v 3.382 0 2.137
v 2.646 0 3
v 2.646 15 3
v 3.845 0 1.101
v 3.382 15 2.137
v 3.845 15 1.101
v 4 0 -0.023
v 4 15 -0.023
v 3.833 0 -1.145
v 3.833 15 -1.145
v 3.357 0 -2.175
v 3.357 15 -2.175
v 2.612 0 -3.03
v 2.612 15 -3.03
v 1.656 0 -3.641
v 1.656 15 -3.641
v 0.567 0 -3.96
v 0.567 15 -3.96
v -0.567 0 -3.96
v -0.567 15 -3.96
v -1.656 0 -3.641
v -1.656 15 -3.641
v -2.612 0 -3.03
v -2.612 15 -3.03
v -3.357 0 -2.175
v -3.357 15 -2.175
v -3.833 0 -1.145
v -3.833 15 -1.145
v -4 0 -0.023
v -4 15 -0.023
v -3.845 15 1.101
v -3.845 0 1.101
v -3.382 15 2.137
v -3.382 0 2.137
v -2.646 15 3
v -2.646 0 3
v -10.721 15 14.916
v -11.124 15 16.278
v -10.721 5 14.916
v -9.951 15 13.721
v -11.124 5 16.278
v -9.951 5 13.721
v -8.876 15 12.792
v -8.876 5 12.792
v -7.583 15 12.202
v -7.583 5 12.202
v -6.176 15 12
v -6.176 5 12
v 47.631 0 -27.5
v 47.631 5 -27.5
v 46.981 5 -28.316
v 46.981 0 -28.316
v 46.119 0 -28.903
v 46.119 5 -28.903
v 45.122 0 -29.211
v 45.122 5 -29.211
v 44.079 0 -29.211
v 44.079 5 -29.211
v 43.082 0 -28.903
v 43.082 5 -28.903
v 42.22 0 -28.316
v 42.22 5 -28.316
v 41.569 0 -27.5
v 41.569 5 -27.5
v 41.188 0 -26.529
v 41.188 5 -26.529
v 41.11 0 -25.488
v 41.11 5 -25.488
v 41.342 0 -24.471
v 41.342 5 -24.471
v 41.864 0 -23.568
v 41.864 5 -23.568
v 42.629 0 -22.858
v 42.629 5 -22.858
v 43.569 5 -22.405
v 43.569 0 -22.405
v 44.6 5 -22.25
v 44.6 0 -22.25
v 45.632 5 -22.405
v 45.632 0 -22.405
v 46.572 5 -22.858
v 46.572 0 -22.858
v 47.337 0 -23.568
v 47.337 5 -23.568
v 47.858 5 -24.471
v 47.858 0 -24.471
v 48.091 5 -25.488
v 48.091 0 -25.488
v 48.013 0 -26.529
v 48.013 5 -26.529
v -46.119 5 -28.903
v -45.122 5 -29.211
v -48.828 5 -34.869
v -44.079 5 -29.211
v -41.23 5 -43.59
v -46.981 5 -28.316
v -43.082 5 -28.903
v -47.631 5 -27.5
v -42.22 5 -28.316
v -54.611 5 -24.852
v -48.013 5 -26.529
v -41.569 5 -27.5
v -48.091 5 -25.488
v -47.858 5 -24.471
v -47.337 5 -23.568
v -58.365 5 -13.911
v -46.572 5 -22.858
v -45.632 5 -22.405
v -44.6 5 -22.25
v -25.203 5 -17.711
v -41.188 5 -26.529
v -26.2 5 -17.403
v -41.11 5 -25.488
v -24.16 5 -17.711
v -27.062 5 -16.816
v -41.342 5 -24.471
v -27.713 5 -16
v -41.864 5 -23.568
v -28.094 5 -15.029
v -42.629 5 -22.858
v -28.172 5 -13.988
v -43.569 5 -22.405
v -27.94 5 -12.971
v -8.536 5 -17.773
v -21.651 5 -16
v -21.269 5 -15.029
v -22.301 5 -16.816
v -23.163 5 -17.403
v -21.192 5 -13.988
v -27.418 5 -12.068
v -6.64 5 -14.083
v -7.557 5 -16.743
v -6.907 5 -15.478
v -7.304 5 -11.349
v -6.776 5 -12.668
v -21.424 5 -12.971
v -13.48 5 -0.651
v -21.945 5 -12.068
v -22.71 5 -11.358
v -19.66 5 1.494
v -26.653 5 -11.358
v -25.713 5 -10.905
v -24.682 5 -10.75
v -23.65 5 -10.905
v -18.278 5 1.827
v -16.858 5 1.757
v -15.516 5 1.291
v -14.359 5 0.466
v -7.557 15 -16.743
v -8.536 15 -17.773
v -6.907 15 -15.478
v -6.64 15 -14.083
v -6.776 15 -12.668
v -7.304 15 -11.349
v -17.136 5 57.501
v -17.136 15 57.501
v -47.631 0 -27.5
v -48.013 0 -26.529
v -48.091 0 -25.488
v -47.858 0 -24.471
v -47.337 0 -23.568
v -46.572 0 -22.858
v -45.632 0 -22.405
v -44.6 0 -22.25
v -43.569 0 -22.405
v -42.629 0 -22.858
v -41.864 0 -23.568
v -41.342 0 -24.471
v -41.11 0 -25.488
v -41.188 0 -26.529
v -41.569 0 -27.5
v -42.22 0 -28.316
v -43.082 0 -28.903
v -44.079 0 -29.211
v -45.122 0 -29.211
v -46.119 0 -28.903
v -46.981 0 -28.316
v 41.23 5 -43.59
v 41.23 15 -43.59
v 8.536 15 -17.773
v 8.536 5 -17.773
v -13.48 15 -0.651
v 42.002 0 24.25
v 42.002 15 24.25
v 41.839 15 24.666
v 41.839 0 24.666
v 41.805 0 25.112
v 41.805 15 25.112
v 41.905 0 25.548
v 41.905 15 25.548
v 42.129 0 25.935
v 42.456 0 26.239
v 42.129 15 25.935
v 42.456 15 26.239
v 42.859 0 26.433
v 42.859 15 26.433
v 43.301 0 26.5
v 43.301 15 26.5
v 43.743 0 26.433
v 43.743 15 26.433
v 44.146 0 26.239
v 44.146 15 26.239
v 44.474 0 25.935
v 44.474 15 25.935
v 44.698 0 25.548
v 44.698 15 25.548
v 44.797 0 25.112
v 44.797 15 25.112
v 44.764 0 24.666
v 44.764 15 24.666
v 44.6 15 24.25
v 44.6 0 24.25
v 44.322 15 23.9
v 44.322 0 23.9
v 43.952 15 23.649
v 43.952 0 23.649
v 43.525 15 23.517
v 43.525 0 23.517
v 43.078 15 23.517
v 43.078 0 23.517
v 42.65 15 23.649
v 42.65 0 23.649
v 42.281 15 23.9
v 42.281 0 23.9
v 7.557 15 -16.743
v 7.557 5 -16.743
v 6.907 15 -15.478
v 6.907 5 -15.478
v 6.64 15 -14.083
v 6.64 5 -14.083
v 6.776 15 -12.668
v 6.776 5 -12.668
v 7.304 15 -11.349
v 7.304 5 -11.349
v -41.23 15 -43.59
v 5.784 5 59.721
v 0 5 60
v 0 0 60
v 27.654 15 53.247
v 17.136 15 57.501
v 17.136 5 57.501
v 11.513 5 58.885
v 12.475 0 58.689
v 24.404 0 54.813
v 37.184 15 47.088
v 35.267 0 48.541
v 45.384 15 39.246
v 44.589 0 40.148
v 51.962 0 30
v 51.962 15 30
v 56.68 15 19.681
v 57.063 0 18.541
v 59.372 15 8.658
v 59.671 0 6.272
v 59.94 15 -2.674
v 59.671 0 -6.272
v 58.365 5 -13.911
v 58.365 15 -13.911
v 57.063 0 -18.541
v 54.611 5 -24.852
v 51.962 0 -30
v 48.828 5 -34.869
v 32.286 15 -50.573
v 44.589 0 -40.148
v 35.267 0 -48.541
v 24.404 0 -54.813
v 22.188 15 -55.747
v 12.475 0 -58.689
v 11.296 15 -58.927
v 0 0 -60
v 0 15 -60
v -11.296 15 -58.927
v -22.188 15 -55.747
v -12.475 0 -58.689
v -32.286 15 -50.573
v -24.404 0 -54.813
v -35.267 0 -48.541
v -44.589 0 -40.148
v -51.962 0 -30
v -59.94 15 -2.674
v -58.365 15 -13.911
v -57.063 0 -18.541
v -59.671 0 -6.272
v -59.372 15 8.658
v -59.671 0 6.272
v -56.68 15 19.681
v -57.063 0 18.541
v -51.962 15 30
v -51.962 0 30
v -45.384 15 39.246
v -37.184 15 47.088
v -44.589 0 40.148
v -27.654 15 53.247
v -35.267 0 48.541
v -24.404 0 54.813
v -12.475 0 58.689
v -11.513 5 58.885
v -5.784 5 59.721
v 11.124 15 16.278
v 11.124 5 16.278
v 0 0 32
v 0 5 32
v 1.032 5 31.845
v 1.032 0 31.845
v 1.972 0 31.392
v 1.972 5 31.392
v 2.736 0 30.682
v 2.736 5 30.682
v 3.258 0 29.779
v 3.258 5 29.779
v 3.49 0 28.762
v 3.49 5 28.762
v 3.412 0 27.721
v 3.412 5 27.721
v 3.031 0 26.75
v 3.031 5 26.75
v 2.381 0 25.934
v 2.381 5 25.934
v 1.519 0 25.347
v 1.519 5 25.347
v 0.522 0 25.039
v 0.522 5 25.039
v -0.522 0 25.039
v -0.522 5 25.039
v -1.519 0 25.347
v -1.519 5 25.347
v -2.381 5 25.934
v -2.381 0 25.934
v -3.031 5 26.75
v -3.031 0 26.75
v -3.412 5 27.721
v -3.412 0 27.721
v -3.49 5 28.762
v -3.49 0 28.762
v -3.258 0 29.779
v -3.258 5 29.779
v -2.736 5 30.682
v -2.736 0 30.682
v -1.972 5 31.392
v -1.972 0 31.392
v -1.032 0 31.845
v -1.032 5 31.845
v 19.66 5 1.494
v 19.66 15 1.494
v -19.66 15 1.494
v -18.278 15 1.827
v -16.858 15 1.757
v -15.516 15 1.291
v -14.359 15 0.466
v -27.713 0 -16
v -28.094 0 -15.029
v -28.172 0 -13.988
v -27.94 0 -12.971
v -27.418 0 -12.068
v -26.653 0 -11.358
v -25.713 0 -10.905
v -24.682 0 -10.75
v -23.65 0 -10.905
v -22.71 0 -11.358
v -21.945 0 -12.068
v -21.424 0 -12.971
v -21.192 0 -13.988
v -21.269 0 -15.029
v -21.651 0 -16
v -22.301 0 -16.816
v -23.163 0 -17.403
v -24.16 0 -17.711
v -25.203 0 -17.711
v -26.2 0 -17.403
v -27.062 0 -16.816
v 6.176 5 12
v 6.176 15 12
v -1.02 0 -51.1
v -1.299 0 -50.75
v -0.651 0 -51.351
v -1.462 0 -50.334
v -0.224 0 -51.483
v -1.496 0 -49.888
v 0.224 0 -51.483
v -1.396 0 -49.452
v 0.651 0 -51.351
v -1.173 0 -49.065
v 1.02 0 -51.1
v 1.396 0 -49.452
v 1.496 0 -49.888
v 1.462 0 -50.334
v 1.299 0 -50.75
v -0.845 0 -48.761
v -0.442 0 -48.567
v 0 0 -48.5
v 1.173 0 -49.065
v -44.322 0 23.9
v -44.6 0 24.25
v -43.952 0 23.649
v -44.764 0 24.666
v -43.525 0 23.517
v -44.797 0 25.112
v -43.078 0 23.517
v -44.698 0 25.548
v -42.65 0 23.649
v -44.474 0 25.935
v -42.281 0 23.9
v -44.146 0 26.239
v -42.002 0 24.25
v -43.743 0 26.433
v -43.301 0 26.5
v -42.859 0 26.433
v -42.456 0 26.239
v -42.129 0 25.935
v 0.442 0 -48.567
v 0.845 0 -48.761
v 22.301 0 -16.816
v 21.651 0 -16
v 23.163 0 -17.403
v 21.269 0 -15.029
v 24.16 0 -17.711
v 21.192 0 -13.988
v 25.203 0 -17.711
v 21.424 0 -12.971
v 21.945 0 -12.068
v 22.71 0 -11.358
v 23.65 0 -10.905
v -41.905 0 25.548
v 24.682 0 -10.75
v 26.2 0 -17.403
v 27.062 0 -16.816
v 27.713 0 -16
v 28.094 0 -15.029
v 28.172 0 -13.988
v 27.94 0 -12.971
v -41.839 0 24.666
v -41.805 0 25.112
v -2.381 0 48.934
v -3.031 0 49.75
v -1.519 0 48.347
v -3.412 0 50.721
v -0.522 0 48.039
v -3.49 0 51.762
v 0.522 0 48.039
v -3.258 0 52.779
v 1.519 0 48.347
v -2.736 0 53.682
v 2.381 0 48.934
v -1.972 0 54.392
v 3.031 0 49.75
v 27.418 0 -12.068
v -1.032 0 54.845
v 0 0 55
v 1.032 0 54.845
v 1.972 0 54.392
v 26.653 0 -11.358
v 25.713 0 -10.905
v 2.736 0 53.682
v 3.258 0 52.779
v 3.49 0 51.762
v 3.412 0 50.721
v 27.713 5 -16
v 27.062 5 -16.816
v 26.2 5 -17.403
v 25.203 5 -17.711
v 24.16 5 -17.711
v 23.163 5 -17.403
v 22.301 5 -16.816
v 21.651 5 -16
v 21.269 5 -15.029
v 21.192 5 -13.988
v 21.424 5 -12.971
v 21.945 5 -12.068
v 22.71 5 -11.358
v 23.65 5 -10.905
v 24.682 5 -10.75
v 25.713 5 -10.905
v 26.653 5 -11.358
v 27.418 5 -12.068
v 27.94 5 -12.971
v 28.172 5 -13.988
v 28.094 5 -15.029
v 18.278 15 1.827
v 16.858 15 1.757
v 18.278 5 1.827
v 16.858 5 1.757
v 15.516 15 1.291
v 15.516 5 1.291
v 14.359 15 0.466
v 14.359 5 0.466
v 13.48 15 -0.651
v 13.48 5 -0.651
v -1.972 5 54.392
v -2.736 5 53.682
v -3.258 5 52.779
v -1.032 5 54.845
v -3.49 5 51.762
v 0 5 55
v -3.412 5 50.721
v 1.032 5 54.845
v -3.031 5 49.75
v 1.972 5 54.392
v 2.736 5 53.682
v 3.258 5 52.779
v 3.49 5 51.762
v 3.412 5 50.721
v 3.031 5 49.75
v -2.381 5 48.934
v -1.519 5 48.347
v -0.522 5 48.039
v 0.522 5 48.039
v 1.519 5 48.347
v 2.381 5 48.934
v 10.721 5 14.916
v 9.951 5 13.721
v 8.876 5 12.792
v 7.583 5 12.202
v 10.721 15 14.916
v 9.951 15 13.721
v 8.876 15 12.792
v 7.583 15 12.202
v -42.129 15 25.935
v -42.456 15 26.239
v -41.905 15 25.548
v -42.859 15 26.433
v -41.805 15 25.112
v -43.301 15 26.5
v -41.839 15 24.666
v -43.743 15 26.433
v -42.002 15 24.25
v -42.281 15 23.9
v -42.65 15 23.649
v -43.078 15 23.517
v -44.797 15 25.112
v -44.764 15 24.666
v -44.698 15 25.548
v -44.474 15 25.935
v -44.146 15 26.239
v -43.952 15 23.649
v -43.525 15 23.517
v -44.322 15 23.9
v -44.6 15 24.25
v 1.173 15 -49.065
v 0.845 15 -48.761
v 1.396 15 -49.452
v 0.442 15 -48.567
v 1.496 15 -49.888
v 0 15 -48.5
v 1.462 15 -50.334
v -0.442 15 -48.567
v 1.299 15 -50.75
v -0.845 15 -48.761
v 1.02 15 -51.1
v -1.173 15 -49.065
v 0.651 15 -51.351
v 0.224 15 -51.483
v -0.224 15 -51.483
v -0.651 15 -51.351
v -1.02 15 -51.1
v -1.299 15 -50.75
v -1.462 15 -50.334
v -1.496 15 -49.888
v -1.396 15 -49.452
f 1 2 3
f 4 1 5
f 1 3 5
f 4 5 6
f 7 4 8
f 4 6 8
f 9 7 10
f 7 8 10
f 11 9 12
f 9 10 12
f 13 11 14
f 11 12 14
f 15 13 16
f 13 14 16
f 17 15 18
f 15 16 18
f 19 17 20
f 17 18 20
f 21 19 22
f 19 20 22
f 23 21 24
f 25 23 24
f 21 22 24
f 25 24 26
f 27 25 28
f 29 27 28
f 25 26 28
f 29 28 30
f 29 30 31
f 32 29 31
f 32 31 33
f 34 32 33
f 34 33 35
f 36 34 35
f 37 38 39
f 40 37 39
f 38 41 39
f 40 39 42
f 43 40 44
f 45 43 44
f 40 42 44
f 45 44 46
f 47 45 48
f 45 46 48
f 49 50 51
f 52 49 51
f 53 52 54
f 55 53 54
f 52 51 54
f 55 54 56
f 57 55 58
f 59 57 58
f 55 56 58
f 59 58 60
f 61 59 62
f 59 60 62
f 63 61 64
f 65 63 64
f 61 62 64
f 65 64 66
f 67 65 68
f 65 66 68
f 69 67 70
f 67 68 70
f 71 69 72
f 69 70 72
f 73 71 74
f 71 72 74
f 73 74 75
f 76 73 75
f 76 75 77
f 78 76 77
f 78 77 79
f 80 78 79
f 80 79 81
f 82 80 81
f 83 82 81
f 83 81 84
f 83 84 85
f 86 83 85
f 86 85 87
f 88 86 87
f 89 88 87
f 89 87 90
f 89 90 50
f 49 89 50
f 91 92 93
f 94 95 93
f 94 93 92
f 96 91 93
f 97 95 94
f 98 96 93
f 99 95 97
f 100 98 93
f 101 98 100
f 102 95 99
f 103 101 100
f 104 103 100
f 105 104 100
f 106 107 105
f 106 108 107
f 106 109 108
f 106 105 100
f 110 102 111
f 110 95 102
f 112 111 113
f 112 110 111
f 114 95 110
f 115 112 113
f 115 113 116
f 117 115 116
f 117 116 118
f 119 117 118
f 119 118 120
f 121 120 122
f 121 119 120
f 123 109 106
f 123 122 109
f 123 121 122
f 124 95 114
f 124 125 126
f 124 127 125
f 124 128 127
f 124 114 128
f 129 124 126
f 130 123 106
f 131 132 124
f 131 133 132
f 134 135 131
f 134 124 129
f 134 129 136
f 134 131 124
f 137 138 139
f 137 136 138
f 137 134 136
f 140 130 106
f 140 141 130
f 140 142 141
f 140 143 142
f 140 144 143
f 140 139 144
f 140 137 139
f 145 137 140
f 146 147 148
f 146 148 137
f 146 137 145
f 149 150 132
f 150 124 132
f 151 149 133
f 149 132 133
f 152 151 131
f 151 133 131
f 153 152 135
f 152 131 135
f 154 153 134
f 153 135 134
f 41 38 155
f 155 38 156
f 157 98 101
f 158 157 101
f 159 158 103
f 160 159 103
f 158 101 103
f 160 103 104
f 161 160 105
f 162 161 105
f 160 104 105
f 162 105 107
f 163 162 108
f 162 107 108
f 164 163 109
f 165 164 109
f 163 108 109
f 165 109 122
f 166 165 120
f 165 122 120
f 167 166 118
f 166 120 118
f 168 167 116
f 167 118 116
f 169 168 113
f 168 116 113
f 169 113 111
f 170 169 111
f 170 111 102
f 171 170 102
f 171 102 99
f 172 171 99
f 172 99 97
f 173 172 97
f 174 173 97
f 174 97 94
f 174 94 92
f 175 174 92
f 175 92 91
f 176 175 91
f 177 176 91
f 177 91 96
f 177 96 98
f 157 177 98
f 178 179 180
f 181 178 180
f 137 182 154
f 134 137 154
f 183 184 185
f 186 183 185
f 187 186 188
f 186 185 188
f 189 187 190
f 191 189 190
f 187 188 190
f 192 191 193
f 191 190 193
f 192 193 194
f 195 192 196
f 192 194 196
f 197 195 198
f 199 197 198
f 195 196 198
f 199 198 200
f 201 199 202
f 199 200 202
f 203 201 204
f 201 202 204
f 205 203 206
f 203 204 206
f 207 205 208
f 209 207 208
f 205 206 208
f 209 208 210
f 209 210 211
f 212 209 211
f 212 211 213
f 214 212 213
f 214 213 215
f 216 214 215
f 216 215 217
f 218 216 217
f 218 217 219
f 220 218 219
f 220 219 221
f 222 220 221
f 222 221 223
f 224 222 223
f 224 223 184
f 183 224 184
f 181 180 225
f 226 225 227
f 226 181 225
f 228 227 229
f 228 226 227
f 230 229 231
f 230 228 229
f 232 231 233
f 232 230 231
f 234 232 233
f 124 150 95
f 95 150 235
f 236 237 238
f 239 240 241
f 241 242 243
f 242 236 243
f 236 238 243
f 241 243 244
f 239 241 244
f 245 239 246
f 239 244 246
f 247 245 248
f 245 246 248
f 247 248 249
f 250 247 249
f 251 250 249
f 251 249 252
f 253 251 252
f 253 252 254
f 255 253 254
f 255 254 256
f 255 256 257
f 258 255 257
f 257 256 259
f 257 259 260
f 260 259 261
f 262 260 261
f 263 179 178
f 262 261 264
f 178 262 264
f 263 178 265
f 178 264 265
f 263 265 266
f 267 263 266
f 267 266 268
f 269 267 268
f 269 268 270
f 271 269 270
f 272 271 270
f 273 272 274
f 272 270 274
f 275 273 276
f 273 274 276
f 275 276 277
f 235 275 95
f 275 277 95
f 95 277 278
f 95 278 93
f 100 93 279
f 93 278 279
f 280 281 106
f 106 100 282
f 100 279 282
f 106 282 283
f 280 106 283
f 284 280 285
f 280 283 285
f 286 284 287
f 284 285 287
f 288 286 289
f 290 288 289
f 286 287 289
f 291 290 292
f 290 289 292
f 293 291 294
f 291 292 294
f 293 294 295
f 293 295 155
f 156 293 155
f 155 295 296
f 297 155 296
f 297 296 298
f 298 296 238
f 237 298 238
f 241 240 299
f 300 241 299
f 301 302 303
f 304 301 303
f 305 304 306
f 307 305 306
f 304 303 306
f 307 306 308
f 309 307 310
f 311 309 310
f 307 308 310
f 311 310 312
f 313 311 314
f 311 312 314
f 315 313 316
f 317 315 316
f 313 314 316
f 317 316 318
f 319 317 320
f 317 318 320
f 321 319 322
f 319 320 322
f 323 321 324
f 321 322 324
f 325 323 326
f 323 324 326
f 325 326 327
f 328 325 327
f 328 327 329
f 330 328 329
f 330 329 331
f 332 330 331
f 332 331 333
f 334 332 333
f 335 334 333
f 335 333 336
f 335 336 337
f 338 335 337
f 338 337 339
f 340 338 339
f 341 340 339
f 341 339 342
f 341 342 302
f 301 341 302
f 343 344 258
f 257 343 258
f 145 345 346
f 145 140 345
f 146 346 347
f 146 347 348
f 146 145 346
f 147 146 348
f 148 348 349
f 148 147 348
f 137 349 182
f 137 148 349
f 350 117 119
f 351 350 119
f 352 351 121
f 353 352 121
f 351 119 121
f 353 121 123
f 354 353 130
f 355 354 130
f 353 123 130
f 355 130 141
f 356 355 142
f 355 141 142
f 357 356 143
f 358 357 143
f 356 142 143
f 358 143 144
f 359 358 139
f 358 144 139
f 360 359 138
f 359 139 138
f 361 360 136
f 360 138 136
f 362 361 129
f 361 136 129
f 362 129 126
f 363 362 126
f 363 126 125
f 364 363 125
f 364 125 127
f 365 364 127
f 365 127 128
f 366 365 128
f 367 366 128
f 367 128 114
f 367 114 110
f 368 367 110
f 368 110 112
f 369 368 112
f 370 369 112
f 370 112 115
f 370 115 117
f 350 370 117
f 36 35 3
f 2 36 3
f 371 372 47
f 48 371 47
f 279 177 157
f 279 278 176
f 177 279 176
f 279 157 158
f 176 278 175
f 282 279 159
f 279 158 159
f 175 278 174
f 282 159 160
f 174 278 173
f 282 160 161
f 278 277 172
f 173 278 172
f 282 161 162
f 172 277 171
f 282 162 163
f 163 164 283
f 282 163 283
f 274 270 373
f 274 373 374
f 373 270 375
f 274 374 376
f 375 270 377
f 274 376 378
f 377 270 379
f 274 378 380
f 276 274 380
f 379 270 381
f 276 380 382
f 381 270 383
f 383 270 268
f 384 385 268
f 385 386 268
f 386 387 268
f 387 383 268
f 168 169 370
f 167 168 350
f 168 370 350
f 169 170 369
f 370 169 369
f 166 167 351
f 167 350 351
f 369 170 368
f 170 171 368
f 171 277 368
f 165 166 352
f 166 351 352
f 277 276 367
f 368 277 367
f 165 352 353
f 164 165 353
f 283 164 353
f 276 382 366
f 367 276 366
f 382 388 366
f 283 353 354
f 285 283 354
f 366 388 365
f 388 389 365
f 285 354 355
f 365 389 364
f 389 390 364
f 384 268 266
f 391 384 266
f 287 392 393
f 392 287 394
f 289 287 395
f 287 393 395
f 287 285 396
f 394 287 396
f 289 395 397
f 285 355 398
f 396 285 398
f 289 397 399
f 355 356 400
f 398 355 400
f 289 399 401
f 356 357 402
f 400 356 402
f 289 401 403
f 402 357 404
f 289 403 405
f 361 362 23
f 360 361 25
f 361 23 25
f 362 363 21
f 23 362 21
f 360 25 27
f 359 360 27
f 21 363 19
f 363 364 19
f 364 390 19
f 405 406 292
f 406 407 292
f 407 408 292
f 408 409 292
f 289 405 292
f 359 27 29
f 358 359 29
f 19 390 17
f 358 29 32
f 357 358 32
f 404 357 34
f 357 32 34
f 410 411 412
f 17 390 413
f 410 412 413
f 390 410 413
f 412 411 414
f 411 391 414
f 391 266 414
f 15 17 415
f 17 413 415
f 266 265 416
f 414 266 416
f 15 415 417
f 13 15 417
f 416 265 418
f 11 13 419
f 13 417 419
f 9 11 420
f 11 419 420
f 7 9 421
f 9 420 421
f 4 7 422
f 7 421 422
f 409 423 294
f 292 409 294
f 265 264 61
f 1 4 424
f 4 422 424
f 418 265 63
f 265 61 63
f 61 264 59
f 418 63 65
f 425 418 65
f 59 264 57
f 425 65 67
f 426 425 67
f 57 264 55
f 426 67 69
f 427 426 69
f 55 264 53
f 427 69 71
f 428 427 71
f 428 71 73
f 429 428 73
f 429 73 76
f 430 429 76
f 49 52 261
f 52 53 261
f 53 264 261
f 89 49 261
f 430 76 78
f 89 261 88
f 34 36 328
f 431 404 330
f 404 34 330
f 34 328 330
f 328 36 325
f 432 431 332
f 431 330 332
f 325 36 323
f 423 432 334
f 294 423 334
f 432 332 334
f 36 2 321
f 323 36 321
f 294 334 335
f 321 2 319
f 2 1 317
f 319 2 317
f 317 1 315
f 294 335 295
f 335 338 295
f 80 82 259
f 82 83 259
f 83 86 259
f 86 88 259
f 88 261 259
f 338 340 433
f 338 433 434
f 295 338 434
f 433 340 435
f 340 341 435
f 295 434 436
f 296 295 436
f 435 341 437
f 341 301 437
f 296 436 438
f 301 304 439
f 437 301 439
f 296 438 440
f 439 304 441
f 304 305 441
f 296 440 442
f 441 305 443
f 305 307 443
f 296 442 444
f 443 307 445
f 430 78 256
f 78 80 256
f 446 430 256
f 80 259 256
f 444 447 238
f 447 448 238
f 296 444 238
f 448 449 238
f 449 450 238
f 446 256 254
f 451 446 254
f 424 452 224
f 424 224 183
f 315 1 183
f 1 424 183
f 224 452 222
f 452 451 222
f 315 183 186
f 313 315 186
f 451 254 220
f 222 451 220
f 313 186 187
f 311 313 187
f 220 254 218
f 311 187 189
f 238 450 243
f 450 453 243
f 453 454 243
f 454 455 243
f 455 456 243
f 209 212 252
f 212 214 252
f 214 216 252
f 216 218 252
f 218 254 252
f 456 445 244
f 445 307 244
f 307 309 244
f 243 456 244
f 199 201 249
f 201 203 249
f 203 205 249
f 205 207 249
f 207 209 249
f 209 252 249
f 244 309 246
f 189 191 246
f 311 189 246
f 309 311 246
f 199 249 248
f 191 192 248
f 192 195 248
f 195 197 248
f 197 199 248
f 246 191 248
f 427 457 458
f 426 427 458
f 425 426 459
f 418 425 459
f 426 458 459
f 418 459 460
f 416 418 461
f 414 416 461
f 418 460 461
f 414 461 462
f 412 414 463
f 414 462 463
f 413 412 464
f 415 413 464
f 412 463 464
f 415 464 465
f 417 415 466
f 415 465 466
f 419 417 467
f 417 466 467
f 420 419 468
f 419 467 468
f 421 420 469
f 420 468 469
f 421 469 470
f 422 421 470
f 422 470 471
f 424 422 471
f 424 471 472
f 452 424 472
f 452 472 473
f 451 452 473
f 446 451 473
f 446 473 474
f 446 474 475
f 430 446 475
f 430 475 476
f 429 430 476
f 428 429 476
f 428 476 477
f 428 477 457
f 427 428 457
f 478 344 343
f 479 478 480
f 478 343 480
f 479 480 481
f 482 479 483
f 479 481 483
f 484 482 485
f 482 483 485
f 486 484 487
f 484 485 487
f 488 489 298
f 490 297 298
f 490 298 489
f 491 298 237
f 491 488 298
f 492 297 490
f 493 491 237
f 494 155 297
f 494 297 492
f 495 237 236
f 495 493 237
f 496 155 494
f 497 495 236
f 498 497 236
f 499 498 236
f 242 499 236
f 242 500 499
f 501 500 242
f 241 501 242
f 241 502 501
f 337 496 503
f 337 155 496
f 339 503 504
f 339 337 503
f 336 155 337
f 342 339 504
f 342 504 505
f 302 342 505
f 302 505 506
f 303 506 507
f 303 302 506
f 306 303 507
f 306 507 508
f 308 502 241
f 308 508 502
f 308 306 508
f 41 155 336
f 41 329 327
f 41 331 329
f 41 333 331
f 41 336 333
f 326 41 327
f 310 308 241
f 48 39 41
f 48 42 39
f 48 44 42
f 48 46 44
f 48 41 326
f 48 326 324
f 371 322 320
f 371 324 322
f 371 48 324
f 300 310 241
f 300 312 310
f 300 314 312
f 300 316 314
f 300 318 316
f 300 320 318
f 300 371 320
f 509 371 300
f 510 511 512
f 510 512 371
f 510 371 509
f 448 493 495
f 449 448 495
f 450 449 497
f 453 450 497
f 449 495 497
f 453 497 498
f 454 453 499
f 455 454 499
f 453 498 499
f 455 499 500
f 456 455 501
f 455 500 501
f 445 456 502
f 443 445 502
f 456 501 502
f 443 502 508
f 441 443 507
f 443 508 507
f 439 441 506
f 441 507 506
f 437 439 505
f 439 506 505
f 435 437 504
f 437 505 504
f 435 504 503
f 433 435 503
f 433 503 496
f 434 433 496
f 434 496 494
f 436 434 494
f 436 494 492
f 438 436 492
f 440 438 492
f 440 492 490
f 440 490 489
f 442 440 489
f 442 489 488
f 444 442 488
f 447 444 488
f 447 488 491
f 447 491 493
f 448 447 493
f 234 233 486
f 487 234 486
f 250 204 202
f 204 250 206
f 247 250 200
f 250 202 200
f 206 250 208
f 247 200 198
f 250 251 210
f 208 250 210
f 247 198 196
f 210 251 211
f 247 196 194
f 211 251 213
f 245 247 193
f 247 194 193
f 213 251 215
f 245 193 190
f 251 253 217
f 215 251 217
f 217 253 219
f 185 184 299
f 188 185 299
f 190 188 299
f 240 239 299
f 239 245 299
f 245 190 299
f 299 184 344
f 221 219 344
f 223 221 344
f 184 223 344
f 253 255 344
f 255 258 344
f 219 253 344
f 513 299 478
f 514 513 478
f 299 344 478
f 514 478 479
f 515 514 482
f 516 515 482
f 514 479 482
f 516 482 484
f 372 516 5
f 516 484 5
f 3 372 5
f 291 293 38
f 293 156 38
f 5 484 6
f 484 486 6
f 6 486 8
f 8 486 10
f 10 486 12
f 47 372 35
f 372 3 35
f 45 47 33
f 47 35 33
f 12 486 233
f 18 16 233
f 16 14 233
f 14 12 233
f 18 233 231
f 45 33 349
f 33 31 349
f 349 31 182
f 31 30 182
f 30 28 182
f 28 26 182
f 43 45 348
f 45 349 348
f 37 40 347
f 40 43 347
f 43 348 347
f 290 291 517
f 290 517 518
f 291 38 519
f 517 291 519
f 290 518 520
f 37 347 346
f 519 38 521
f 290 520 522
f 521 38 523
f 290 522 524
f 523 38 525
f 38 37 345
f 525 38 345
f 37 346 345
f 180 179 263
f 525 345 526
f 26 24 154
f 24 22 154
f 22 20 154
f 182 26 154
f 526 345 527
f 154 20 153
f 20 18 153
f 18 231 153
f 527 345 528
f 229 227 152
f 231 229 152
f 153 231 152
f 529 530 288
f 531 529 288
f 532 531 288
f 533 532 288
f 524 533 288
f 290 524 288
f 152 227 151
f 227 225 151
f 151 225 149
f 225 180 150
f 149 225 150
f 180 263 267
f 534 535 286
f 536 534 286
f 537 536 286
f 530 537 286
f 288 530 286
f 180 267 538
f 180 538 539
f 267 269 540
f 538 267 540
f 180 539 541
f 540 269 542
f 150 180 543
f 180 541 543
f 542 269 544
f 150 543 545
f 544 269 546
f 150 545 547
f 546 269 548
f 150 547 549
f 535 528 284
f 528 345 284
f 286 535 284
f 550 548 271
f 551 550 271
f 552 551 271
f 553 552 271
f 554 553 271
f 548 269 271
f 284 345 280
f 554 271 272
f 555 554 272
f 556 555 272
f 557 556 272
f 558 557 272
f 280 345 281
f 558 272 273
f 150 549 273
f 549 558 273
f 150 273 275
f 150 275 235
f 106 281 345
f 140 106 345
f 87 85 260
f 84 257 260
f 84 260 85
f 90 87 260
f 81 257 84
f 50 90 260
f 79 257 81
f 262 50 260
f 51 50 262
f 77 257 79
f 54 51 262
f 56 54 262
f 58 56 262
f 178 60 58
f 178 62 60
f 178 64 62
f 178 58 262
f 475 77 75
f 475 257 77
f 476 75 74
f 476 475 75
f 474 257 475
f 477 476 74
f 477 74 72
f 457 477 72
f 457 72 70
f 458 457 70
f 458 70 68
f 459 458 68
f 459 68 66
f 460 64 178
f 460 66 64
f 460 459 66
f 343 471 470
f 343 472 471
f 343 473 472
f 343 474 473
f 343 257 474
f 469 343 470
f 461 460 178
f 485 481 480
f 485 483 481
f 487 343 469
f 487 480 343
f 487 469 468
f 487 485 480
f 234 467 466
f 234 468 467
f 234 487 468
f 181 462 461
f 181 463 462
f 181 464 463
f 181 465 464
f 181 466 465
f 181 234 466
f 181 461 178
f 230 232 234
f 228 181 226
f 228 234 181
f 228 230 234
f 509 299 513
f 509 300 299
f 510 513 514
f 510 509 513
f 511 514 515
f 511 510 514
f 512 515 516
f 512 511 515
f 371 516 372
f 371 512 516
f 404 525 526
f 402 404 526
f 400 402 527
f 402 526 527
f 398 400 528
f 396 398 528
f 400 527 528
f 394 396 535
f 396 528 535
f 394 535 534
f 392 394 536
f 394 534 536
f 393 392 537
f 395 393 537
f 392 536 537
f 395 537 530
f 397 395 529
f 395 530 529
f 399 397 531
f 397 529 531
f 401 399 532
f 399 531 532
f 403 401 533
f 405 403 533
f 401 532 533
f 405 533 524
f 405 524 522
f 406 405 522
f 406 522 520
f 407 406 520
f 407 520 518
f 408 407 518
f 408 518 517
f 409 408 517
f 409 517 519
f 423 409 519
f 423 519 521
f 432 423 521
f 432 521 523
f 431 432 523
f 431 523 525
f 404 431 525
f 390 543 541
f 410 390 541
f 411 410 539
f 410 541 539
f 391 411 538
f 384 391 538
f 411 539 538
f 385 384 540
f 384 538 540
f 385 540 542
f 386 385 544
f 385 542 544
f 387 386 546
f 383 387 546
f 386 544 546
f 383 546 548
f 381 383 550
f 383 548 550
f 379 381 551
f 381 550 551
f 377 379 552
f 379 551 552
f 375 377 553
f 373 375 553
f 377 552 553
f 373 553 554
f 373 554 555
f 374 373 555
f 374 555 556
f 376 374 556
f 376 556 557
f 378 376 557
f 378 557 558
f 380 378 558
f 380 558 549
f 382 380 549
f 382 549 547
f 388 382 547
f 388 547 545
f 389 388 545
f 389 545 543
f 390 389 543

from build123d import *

# Parameters (mm, degrees)
SKETCH1_R           = 60
BOSS_EXTRUDE1_DEPTH = 15
CUT_EXTRUDE1_REACH  = 88.168
CUT_EXTRUDE2_DEPTH  = 10
CUT_EXTRUDE3_REACH  = 87.44
SKETCH3_R           = 3.5
CIRPATTERN1_COUNT   = 3
CIRPATTERN2_COUNT   = 3
FILLET1_R           = 5
CUT_EXTRUDE4_REACH  = 88.168
SKETCH4_R           = 1.5
CIRPATTERN3_COUNT   = 3
BOSS_EXTRUDE2_REACH = 88.168


with BuildPart() as part:
    # Sketch1 → Boss-Extrude1 (new body)
    with BuildSketch(Plane(origin=(0, 0, 0), x_dir=(1, 0, 0), z_dir=(0, 1, 0))):
        Circle(SKETCH1_R)
    extrude(amount=BOSS_EXTRUDE1_DEPTH)

    # Sketch2 → Cut-Extrude1 (cut, up to next)
    with BuildSketch(Plane(origin=(0, 15, 0), x_dir=(1, 0, 0), z_dir=(0, 1, 0)), mode=Mode.PRIVATE) as cut_extrude1_sk1:
        with BuildLine():
            ThreePointArc((2.645751311, -3), (0, 4), (-2.645751311, -3))
            Line((-2.645751311, -3), (2.645751311, -3))
        make_face()
    cut_extrude1_tool1 = extrude(cut_extrude1_sk1.sketch, amount=-CUT_EXTRUDE1_REACH, mode=Mode.PRIVATE) & part.part
    add(cut_extrude1_tool1.solids().sort_by_distance((0, 15, -0.264732))[0], mode=Mode.SUBTRACT)

    # Sketch2<3> → Cut-Extrude2 (cut)
    with BuildSketch(Plane(origin=(0, 15, 0), x_dir=(1, 0, 0), z_dir=(0, 1, 0))):
        with BuildLine():
            Line((-2.645751311, -3), (2.645751311, -3))
            ThreePointArc((2.645751311, -3), (0, 4), (-2.645751311, -3))
        make_face()
        Polygon((-17.5, -60), (17.5, -60), (10.5, -12), (-10.5, -12), align=None)
    cut_extrude2 = extrude(amount=-CUT_EXTRUDE2_DEPTH, mode=Mode.SUBTRACT)

    # Sketch3 → Cut-Extrude3 (cut, up to next)
    with BuildSketch(Plane(origin=(0, 5, 0), x_dir=(1, 0, 0), z_dir=(0, 1, 0)), mode=Mode.PRIVATE) as cut_extrude3_sk1:
        with Locations((0, -28.5)):
            Circle(SKETCH3_R)
    cut_extrude3_tool1 = extrude(cut_extrude3_sk1.sketch, amount=-CUT_EXTRUDE3_REACH, mode=Mode.PRIVATE) & part.part
    # Sketch3 → Cut-Extrude3 (cut, up to next)
    with BuildSketch(Plane(origin=(0, 5, 0), x_dir=(1, 0, 0), z_dir=(0, 1, 0)), mode=Mode.PRIVATE) as cut_extrude3_sk2:
        with Locations((0, -51.5)):
            Circle(SKETCH3_R)
    cut_extrude3_tool2 = extrude(cut_extrude3_sk2.sketch, amount=-CUT_EXTRUDE3_REACH, mode=Mode.PRIVATE) & part.part
    cut_extrude3_1 = cut_extrude3_tool1.solids().sort_by_distance((0, 5, 28.5))[0]
    add(cut_extrude3_1, mode=Mode.SUBTRACT)
    cut_extrude3_2 = cut_extrude3_tool2.solids().sort_by_distance((0, 5, 51.5))[0]
    add(cut_extrude3_2, mode=Mode.SUBTRACT)
    cut_extrude3 = cut_extrude3_1 + cut_extrude3_2  # Cut-Extrude3 as one shape, for the pattern or mirror that repeats it

    # CirPattern1: Cut-Extrude2 ×3 about axis
    cirpattern1_axis = Axis((0, -0.001, 0), (0, 1, 0))
    for i in range(1, CIRPATTERN1_COUNT):
        add(cut_extrude2.rotate(cirpattern1_axis, i * 360 / CIRPATTERN1_COUNT), mode=Mode.SUBTRACT)

    # CirPattern2: Cut-Extrude3 ×3 about axis
    cirpattern2_axis = Axis((0, 15, 0), (0, 1, 0))
    for i in range(1, CIRPATTERN2_COUNT):
        add(cut_extrude3.rotate(cirpattern2_axis, i * 360 / CIRPATTERN2_COUNT), mode=Mode.SUBTRACT)

    # Fillet1
    fillet1_edges = [part.edges().sort_by_distance(p)[0] for p in [
        (10.5, 10, 12),
        (-10.5, 10, 12),
        (-15.642304845, 10, 3.09326674),
        (-5.142304845, 10, -15.09326674),
        (15.642304845, 10, 3.09326674),
        (5.142304845, 10, -15.09326674),
    ]]
    fillet(fillet1_edges, radius=FILLET1_R)

    # Sketch4 → Cut-Extrude4 (cut, up to next)
    with BuildSketch(Plane(origin=(0, 15, 0), x_dir=(1, 0, 0), z_dir=(0, 1, 0)), mode=Mode.PRIVATE) as cut_extrude4_sk1:
        with Locations((0, 50)):
            Circle(SKETCH4_R)
    cut_extrude4_tool1 = extrude(cut_extrude4_sk1.sketch, amount=-CUT_EXTRUDE4_REACH, mode=Mode.PRIVATE) & part.part
    cut_extrude4 = cut_extrude4_tool1.solids().sort_by_distance((0, 15, -50))[0]
    add(cut_extrude4, mode=Mode.SUBTRACT)

    # CirPattern3: Cut-Extrude4 ×3 about axis
    cirpattern3_axis = Axis((0, -0.001, 0), (0, 1, 0))
    for i in range(1, CIRPATTERN3_COUNT):
        add(cut_extrude4.rotate(cirpattern3_axis, i * 360 / CIRPATTERN3_COUNT), mode=Mode.SUBTRACT)

    # Sketch5 → Boss-Extrude2 (add, up to next)
    with BuildSketch(Plane(origin=(0, 15, 0), x_dir=(1, 0, 0), z_dir=(0, 1, 0)), mode=Mode.PRIVATE) as boss_extrude2_sk1:
        with BuildLine():
            Line((-2.645751311, -3), (2.645751311, -3))
            ThreePointArc((2.645751311, -3), (0, -4), (-2.645751311, -3))
        make_face()
    boss_extrude2_tool1 = extrude(boss_extrude2_sk1.sketch, amount=-BOSS_EXTRUDE2_REACH, mode=Mode.PRIVATE) - part.part
    add(boss_extrude2_tool1.solids().sort_by_distance((0, 15, 3.404621))[0])


solid = part.part
